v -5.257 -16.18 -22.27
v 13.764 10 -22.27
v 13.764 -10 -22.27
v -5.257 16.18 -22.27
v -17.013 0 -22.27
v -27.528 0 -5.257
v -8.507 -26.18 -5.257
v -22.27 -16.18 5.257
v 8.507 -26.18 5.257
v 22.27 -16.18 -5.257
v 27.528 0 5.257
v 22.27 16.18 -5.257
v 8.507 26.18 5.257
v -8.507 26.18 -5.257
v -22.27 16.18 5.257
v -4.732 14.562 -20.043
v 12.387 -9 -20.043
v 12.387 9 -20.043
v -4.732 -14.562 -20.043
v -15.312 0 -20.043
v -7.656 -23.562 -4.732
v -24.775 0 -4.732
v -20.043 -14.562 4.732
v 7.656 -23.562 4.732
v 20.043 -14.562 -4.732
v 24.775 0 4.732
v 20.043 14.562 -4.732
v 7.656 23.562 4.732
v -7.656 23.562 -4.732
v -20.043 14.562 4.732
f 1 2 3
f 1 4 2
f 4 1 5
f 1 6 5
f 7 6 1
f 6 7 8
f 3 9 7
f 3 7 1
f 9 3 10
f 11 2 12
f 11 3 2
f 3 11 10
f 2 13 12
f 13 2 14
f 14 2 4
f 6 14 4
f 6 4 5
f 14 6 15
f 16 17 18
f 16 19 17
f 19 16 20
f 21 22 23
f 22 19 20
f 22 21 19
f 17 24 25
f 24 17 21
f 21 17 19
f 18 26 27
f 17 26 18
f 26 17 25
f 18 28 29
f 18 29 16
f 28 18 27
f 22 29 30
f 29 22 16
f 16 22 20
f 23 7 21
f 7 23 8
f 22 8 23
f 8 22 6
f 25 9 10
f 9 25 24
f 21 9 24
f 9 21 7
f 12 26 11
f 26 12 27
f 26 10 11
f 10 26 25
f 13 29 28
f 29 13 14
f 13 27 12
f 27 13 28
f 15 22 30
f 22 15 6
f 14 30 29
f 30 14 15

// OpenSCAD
// file: ../functions/constants.scad
/* * * * * * * * * * * * * * * * * * * * * * * * * * * * * * * * * * * * *\
 * Copyright (C) Claus Schrammel <claus@f05fk.net>                       *
 *                                                                       *
 * This program is free software: you can redistribute it and/or modify  *
 * it under the terms of the GNU General Public License as published by  *
 * the Free Software Foundation, either version 3 of the License, or     *
 * (at your option) any later version.                                   *
 *                                                                       *
 * This program is distributed in the hope that it will be useful,       *
 * but WITHOUT ANY WARRANTY; without even the implied warranty of        *
 * MERCHANTABILITY or FITNESS FOR A PARTICULAR PURPOSE.  See the         *
 * GNU General Public License for more details.                          *
 *                                                                       *
 * You should have received a copy of the GNU General Public License     *
 * along with this program.  If not, see <http://www.gnu.org/licenses/>. *
 *                                                                       *
 * SPDX-License-Identifier: GPL-3.0-or-later                             *
\* * * * * * * * * * * * * * * * * * * * * * * * * * * * * * * * * * * * */

PHI = (1 + sqrt(5)) / 2;
phi = 1 / PHI;
// main file
/* * * * * * * * * * * * * * * * * * * * * * * * * * * * * * * * * * * * *\
 * Copyright (C) Claus Schrammel <claus@f05fk.net>                       *
 *                                                                       *
 * This program is free software: you can redistribute it and/or modify  *
 * it under the terms of the GNU General Public License as published by  *
 * the Free Software Foundation, either version 3 of the License, or     *
 * (at your option) any later version.                                   *
 *                                                                       *
 * This program is distributed in the hope that it will be useful,       *
 * but WITHOUT ANY WARRANTY; without even the implied warranty of        *
 * MERCHANTABILITY or FITNESS FOR A PARTICULAR PURPOSE.  See the         *
 * GNU General Public License for more details.                          *
 *                                                                       *
 * You should have received a copy of the GNU General Public License     *
 * along with this program.  If not, see <http://www.gnu.org/licenses/>. *
 *                                                                       *
 * SPDX-License-Identifier: GPL-3.0-or-later                             *
\* * * * * * * * * * * * * * * * * * * * * * * * * * * * * * * * * * * * */

include <../functions/constants.scad>;

scale(20) DodecahedronBowl();

module DodecahedronBowl() {
    factor = 1 / sqrt(10 - 2 * sqrt(5));
    inner = 0.9;

    polyhedron(
        points = [ [-2 *       cos(  0), -2 *       sin(  0), -PHI - 1],
                   [-2 *       cos( 72), -2 *       sin( 72), -PHI - 1],
                   [-2 *       cos(144), -2 *       sin(144), -PHI - 1],
                   [-2 *       cos(216), -2 *       sin(216), -PHI - 1],
                   [-2 *       cos(288), -2 *       sin(288), -PHI - 1],
                   [-2 * PHI * cos(  0), -2 * PHI * sin(  0), -PHI + 1],
                   [-2 * PHI * cos( 72), -2 * PHI * sin( 72), -PHI + 1],
                   [-2 * PHI * cos(144), -2 * PHI * sin(144), -PHI + 1],
                   [-2 * PHI * cos(216), -2 * PHI * sin(216), -PHI + 1],
                   [-2 * PHI * cos(288), -2 * PHI * sin(288), -PHI + 1],
                   [+2 * PHI * cos(  0), +2 * PHI * sin(  0), +PHI - 1],
                   [+2 * PHI * cos( 72), +2 * PHI * sin( 72), +PHI - 1],
                   [+2 * PHI * cos(144), +2 * PHI * sin(144), +PHI - 1],
                   [+2 * PHI * cos(216), +2 * PHI * sin(216), +PHI - 1],
                   [+2 * PHI * cos(288), +2 * PHI * sin(288), +PHI - 1],

                   [-2 *       cos(  0), -2 *       sin(  0), -PHI - 1] * inner,
                   [-2 *       cos( 72), -2 *       sin( 72), -PHI - 1] * inner,
                   [-2 *       cos(144), -2 *       sin(144), -PHI - 1] * inner,
                   [-2 *       cos(216), -2 *       sin(216), -PHI - 1] * inner,
                   [-2 *       cos(288), -2 *       sin(288), -PHI - 1] * inner,
                   [-2 * PHI * cos(  0), -2 * PHI * sin(  0), -PHI + 1] * inner,
                   [-2 * PHI * cos( 72), -2 * PHI * sin( 72), -PHI + 1] * inner,
                   [-2 * PHI * cos(144), -2 * PHI * sin(144), -PHI + 1] * inner,
                   [-2 * PHI * cos(216), -2 * PHI * sin(216), -PHI + 1] * inner,
                   [-2 * PHI * cos(288), -2 * PHI * sin(288), -PHI + 1] * inner,
                   [+2 * PHI * cos(  0), +2 * PHI * sin(  0), +PHI - 1] * inner,
                   [+2 * PHI * cos( 72), +2 * PHI * sin( 72), +PHI - 1] * inner,
                   [+2 * PHI * cos(144), +2 * PHI * sin(144), +PHI - 1] * inner,
                   [+2 * PHI * cos(216), +2 * PHI * sin(216), +PHI - 1] * inner,
                   [+2 * PHI * cos(288), +2 * PHI * sin(288), +PHI - 1] * inner,
                 ] * factor,
        faces = [ [ 0, 1, 2, 3, 4], [ 1,  0,  5, 13,  6], [ 2,  1,  6, 14,  7],
                  [ 3,  2,  7, 10,  8], [ 4,  3,  8, 11,  9], [ 0,  4,  9, 12,  5],
                  
                  [19, 18, 17, 16, 15], [15, 16, 21, 28, 20], [16, 17, 22, 29, 21],
                  [17, 18, 23, 25, 22], [18, 19, 24, 26, 23], [19, 15, 20, 27, 24],
                  
                  [6, 13, 28, 21], [13, 5, 20, 28], [7, 14, 29, 22], [14, 6, 21, 29], [8, 10, 25, 23],
                  [10, 7, 22, 25], [9, 11, 26, 24], [11, 8, 23, 26], [5, 12, 27, 20], [12, 9, 24, 27],
                ],
        convexity = 10);
}
